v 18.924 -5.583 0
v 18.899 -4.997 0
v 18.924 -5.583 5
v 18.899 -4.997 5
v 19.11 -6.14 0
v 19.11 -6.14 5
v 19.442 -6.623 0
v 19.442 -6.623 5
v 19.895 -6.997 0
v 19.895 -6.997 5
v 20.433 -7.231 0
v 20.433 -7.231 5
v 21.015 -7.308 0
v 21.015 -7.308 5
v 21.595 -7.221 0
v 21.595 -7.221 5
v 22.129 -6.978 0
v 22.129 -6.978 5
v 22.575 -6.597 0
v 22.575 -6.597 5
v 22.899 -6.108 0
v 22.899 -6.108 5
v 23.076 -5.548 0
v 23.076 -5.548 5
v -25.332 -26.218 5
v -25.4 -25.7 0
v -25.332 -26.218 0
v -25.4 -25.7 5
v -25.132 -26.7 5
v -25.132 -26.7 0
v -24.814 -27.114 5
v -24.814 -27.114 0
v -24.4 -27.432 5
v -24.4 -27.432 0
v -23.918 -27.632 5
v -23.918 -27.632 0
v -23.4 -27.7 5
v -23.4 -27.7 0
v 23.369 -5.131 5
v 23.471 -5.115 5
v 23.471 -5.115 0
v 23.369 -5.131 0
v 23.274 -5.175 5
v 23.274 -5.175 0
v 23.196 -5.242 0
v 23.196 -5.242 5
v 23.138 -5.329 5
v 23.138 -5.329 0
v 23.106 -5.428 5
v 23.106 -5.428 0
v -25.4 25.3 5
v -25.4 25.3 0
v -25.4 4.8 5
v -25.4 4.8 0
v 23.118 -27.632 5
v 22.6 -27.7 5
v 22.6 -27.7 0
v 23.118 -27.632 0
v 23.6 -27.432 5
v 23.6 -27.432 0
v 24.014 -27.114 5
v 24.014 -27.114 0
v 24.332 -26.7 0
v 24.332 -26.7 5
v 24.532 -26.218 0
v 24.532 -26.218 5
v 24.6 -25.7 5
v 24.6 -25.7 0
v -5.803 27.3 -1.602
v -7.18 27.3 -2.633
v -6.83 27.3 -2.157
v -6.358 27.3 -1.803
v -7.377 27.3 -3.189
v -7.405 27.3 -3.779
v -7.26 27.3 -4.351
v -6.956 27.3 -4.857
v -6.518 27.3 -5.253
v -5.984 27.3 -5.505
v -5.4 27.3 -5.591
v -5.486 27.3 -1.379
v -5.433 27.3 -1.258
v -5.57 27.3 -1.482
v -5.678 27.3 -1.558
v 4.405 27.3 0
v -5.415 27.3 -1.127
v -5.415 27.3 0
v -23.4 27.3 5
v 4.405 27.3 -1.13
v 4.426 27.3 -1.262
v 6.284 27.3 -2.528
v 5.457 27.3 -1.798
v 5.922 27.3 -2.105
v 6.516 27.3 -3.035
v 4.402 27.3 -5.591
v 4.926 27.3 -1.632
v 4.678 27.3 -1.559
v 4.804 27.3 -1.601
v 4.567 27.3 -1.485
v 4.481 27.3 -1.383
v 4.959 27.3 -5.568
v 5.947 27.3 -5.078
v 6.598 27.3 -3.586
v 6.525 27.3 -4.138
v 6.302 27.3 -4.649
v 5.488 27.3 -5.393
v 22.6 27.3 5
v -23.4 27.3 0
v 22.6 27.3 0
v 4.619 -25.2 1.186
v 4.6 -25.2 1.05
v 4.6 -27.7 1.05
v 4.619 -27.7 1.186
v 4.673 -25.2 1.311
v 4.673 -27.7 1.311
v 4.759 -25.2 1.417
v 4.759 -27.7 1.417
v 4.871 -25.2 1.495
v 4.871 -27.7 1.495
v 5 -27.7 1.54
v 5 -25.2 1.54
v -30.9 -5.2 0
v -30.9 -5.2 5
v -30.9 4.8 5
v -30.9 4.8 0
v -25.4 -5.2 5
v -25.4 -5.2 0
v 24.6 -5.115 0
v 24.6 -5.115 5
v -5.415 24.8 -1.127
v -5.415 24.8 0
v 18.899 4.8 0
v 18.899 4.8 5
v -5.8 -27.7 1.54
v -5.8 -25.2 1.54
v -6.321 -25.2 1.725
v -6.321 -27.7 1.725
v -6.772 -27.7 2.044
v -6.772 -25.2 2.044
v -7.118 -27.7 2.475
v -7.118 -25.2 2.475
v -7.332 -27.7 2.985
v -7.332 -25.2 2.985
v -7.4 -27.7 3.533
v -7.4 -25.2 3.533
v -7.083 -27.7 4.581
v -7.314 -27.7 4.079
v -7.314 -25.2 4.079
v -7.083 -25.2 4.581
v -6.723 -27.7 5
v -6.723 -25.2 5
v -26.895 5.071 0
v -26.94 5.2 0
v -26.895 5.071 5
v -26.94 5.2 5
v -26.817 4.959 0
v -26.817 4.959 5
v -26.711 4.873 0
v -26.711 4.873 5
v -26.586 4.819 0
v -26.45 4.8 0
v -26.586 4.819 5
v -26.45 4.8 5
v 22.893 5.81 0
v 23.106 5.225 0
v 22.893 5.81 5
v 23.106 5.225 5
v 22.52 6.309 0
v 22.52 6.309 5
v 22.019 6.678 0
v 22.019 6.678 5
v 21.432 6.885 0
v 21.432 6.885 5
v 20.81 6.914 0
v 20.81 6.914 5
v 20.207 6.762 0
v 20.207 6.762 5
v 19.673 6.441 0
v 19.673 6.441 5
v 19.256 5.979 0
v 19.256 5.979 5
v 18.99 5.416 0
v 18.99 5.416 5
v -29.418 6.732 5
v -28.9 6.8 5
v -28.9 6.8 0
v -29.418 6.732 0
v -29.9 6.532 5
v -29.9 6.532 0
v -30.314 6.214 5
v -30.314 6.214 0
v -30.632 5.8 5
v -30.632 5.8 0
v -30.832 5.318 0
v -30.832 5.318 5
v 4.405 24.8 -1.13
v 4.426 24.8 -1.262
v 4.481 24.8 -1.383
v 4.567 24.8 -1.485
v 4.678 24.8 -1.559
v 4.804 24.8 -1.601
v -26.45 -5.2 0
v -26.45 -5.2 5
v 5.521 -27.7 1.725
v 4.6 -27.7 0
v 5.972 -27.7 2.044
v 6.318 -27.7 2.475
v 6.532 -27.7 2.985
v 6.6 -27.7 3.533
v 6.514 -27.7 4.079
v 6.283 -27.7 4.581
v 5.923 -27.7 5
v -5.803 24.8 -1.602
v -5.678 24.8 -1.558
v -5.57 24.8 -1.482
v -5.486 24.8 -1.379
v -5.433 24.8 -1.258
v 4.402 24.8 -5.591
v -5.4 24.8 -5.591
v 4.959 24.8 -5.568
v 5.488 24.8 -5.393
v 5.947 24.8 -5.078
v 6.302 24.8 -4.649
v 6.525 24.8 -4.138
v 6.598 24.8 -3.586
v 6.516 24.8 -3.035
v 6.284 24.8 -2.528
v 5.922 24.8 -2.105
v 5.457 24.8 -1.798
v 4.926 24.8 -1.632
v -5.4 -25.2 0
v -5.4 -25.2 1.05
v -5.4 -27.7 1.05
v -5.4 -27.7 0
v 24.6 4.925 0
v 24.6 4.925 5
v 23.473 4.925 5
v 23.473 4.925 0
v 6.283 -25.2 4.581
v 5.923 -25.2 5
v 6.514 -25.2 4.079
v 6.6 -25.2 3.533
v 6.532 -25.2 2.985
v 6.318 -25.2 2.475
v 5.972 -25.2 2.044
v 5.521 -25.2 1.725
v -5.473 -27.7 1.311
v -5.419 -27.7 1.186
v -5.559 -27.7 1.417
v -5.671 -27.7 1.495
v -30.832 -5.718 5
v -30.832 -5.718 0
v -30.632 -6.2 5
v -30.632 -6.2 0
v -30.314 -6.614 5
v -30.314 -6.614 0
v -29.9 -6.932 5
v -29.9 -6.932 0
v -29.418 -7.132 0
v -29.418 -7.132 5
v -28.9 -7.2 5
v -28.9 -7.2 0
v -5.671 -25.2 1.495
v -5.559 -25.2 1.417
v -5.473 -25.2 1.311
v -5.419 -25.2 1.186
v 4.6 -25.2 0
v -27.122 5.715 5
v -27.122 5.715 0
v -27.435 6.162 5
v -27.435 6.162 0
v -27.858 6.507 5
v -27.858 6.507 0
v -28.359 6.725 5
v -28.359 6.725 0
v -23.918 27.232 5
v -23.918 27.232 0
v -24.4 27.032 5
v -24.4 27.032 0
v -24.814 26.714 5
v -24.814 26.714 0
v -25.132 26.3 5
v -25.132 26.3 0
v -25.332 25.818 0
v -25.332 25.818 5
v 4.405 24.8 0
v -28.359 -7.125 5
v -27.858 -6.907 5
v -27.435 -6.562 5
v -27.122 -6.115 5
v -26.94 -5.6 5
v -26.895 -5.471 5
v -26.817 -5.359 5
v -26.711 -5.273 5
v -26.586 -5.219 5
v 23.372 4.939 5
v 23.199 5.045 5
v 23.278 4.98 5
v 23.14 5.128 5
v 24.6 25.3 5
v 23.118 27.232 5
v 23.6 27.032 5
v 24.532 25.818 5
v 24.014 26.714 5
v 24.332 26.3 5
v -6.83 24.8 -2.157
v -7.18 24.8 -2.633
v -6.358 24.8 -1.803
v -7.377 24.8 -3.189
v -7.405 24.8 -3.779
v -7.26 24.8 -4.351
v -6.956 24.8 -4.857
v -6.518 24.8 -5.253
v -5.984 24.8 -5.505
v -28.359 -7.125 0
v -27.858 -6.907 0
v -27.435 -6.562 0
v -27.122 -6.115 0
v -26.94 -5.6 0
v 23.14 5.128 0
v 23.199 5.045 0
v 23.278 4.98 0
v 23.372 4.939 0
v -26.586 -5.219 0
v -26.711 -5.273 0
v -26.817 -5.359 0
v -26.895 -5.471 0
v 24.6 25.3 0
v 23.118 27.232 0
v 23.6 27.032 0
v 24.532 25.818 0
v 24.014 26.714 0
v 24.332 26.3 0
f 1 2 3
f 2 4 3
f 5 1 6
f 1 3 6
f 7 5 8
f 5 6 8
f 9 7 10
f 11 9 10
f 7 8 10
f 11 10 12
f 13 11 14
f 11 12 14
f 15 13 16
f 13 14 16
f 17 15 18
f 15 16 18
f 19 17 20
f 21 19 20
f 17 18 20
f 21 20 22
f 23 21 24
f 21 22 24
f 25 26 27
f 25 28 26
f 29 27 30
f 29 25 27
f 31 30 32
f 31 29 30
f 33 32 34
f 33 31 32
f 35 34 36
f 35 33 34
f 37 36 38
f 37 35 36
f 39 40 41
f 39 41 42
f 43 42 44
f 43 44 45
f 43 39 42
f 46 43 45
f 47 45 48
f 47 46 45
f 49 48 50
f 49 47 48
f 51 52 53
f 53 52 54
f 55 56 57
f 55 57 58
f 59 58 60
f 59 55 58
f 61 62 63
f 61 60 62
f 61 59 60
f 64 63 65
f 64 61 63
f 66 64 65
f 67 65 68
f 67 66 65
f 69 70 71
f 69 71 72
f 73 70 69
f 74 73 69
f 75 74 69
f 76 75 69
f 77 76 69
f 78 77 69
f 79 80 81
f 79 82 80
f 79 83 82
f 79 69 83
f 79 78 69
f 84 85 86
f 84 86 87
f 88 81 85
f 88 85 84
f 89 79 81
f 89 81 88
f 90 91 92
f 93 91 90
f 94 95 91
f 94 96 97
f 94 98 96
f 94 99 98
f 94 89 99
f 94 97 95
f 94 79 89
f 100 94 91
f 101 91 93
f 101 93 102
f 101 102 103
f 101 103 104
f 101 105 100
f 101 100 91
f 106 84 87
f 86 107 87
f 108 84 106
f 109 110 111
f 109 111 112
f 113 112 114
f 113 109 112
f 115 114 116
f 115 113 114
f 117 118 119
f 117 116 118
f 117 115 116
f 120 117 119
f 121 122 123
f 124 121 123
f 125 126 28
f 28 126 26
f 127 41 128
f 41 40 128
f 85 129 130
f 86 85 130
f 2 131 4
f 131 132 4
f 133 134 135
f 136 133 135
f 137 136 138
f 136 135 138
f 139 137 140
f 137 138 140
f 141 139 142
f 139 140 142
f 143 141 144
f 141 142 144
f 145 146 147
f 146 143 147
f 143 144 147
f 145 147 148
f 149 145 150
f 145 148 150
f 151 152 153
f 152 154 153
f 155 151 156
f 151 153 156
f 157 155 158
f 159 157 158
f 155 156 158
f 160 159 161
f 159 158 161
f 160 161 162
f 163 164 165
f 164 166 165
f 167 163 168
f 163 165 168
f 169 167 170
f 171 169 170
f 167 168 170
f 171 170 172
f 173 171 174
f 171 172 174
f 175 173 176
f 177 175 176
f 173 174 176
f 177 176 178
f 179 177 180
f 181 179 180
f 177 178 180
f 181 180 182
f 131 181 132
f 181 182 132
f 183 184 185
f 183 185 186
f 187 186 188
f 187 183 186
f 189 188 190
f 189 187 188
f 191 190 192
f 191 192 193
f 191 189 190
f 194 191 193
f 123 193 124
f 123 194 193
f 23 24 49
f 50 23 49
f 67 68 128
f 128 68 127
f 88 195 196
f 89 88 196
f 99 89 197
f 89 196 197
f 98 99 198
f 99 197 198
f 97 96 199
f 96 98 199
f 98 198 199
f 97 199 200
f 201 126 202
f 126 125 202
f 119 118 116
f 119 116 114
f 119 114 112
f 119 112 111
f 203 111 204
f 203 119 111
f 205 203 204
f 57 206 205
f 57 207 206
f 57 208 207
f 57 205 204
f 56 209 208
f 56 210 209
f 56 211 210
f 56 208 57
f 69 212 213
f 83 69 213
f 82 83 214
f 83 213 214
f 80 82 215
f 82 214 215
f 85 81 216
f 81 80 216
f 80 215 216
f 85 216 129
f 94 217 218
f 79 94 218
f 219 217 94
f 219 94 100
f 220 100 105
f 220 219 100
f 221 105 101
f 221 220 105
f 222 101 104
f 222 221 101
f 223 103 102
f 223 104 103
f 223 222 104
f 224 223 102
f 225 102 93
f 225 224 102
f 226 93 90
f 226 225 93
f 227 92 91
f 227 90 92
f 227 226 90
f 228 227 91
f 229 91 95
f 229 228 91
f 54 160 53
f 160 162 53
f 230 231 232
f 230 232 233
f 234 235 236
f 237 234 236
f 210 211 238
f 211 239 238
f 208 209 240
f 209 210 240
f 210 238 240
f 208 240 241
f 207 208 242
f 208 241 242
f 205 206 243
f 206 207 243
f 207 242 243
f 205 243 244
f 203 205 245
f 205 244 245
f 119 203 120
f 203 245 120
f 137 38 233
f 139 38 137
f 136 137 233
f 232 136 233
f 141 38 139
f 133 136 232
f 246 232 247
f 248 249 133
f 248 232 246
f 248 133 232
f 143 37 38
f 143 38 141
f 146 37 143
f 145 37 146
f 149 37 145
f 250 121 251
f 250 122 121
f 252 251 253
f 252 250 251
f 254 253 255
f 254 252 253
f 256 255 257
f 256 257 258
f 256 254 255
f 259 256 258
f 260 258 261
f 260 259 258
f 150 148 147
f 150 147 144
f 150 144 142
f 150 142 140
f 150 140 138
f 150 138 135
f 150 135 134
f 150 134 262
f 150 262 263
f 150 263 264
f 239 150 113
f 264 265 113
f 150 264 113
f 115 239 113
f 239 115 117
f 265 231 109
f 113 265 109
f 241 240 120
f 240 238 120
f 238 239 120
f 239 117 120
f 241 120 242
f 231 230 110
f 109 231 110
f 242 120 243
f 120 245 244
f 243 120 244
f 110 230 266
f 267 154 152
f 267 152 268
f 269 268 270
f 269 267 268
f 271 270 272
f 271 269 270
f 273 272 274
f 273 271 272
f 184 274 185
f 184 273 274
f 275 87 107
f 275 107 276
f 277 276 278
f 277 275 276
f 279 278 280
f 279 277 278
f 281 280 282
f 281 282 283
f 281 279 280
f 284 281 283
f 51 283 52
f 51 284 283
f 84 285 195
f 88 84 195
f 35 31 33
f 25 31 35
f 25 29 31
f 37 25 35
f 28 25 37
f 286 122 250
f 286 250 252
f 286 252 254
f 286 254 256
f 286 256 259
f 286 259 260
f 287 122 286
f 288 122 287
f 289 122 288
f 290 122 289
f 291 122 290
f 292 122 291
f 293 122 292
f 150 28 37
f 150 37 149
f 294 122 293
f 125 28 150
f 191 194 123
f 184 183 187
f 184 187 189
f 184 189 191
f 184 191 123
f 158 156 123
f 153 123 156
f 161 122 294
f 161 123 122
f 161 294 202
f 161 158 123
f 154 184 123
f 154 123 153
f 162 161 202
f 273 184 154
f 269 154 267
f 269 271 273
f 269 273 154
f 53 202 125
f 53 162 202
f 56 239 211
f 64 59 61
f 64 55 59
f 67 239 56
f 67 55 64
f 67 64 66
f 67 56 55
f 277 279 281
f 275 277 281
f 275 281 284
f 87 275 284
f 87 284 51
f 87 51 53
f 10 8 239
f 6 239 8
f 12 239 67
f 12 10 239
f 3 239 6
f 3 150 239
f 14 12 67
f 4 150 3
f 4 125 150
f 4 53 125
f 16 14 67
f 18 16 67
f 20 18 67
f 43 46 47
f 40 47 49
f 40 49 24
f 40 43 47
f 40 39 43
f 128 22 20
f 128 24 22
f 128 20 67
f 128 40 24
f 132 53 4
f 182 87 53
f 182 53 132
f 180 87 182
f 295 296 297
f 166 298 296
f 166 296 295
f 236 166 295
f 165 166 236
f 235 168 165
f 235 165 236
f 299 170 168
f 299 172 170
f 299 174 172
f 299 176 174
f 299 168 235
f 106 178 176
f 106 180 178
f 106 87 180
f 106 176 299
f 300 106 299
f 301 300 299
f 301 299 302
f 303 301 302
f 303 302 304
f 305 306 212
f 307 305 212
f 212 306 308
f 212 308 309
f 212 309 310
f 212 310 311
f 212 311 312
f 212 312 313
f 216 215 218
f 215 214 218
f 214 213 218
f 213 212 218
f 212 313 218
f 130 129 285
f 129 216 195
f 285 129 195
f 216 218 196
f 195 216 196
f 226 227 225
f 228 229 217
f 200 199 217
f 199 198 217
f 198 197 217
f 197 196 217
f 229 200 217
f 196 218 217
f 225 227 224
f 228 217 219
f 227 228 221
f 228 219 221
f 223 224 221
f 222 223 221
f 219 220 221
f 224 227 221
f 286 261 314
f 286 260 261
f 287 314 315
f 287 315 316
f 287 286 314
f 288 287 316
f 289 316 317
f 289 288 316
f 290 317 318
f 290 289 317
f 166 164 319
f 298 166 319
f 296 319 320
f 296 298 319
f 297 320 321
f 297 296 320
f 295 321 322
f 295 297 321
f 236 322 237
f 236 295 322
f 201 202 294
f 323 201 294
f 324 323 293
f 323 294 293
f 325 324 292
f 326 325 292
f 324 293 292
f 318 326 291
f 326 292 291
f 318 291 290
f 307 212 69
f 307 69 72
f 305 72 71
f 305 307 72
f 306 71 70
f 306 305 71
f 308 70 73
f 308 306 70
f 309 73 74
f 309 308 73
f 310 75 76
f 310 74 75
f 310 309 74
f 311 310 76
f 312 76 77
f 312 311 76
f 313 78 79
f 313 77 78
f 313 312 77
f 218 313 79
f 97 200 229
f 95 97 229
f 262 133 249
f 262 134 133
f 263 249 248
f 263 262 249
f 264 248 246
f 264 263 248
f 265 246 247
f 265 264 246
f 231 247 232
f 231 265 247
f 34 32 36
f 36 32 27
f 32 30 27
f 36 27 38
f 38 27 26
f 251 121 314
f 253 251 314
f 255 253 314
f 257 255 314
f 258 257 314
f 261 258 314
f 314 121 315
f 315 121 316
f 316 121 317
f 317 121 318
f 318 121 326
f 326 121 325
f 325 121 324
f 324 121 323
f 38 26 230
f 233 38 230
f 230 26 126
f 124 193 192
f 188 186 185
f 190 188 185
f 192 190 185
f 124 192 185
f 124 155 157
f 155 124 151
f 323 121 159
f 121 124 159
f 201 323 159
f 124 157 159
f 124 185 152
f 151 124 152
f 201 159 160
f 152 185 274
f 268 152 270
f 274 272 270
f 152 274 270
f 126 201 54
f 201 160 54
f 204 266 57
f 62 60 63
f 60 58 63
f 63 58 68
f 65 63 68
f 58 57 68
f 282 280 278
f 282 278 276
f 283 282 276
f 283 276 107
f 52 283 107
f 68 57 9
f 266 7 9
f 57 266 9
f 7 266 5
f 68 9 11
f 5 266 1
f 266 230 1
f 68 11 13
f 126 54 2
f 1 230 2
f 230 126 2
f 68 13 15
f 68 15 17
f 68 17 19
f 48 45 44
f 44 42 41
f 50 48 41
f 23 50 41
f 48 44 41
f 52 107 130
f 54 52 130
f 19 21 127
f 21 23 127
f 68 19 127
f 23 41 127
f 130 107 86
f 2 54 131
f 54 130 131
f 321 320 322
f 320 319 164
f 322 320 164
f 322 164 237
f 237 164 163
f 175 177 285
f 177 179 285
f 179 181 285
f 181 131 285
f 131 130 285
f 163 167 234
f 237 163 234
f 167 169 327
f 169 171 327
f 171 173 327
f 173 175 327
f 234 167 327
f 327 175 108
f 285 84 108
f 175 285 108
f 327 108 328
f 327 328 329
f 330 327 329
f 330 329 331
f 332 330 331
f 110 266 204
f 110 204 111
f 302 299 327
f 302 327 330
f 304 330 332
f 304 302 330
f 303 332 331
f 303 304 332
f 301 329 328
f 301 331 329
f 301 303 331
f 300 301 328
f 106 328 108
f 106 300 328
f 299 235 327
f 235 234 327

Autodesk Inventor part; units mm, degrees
ref_plane "YZ Plane" through (0, 0, 0) normal (1, 0, 0) x (0, 1, 0)
ref_plane "XZ Plane" through (0, 0, 0) normal (0, 1, 0) x (-1, 0, 0)
ref_plane "XY Plane" through (0, 0, 0) normal (0, 0, 1) x (1, 0, 0)
sketch "Skizze1" plane through (0, 0, 0) normal (0, 0, 1) x (1, 0, 0)
  line L0 (-17.4, -0.2) -> (-25.4, -0.2)
  line L1 (-25.4, -0.2) -> (-25.4, -23.2)
  line L2 (-23.4, -25.2) -> (-0.4, -25.2)
  line L3 (-0.4, -25.2) -> (-0.4, -17.2)
  line L4 (-17.4, -0.2) -> (-17.4, -15.2)
  line L5 (-15.4, -17.2) -> (-0.4, -17.2)
  arc A0 (-25.4, -23.2) -> (-23.4, -25.2) centre (-23.4, -23.2) ccw
  circle A1 centre (-20.4, -20.2) radius 2.425
  circle A2 centre (-21.2, -14.7) radius 2.65
  circle A3 centre (-14.9, -21) radius 2.65
  arc A4 (-17.4, -15.2) -> (-15.4, -17.2) centre (-15.4, -15.2) ccw
  circle A5 centre (-20.4, -20.2) radius 2.425
  circle A6 centre (-14.9, -21) radius 2.65
  circle A7 centre (-21.2, -14.7) radius 2.65
  line L6 (-17.4, -0.2) -> (-0.4, -0.2)
  line L7 (-0.4, -0.2) -> (-0.4, -17.2)
  line L8 (-25.4, -23.2) -> (-25.4, -25.2)
  line L9 (-25.4, -25.2) -> (-23.4, -25.2)
  point P0 (-17.4, -17.2)
  dimension "d278" = 25
  dimension "d279" = 25
  dimension "d2" = 8
  dimension "d281" = 8
  dimension "d282" = 2
  dimension "d283" = 4.85
  dimension "d284" = 20
  dimension "d4" = 20
  dimension "d286" = 5.3
  dimension "d_hole" = 5.3
  dimension "d290" = 20.8
  dimension "d" = 20.8
  dimension "d292" = 2
  dimension "d313" = 6.3
  dimension "d314" = 6.3
  dimension "d330" = 0
  dimension "d331" = 0
  dimension "d332" = 0
extrude "Extrusion1" add sketch "Skizze1" along normal blind 5 contours L4 A4 L5 L3 L2 A0 L1 L0 | L6 L7 L5 A4 L4 | A0 L9 L8 | A1 | A2 | A3
mirror "Mirror6" about plane through (-17.4, -0.2, 0) normal (0, 1, 0) of "Extrusion1"
mirror "Mirror7" about plane through (-0.4, -25.2, 0) normal (1, 0, 0) of "Extrusion1", "Mirror6"
sketch "Sketch26" plane through (0, 0, 5) normal (0, 0, 1) x (1, 0, 0)
  line L0 (24.6, 24.8) -> (-25.4, 24.8) projected
  line L1 (-25.4, -25.2) -> (-25.4, 24.8) projected
  line L2 (-25.4, -25.2) -> (24.6, -25.2) projected
  line L3 (24.6, 24.8) -> (24.6, -25.2) projected
  line L4 (-25.4, -23.2) -> (-25.4, 22.8) projected
  line L5 (-28.9, -7.2) -> (-28.9, -7.2)
  line L6 (-30.9, -5.2) -> (-30.9, 4.8)
  line L7 (-28.9, 6.8) -> (-28.9, 6.8)
  line L8 (-25.4, 6.8) -> (-25.4, -7.2)
  line L9 (-26.9, -5.2) -> (-26.9, 4.8)
  line L10 (-26.4505, 4.8) -> (-25.4, 4.8)
  line L11 (-25.4, 4.8) -> (-25.4, -5.2)
  line L12 (-25.4, -5.2) -> (-26.4505, -5.2)
  line L13 (-26.9, -5.2) -> (-25.4, 4.8) construction
  line L14 (-26.9, 4.8) -> (-25.4, -5.2) construction
  line L15 (-26.9, -5.2) -> (-26.9, -5.2)
  line L16 (-26.9, 4.8) -> (-26.9, 4.8)
  arc A0 (-30.9, -5.2) -> (-28.9, -7.2) centre (-28.9, -5.2) ccw
  arc A1 (-28.9, -7.2) -> (-26.9404, -5.6) centre (-28.9, -5.2) ccw
  arc A2 (-28.9, 6.8) -> (-30.9, 4.8) centre (-28.9, 4.8) ccw
  arc A3 (-26.9404, 5.2) -> (-28.9, 6.8) centre (-28.9, 4.8) ccw
  arc A4 (-26.4505, -5.2) -> (-26.9404, -5.6) centre (-26.4505, -5.7) ccw
  arc A5 (-26.9404, 5.2) -> (-26.4505, 4.8) centre (-26.4505, 5.3) ccw
  point P0 (0, 0)
  point P1 (-26.15, -0.2)
  point P2 (-25.4, -0.2)
  dimension "d293" = 5.5
  dimension "d294" = 14
  dimension "d295" = 18
  dimension "d296" = 10
  dimension "d297" = 1.5
  dimension "d300" = 2
  dimension "d301" = 0.5
extrude "Extrusion13" add sketch "Sketch26" against normal up to surface (5 mm away) contours L1 L12 A4 A1 A0 L6 A2 A3 A5 L10
sketch "Sketch27" plane through (0, 0, 5) normal (0, 0, 1) x (1, 0, 0)
  line L0 (24.6, 24.8) -> (-25.4, 24.8) projected
  line L1 (-25.4, -25.2) -> (-25.4, -5.2) projected
  line L2 (-26.4505, 4.8) -> (-25.4, 4.8) projected
  arc A0 (-26.9404, 5.2) -> (-26.4505, 4.8) centre (-26.4505, 5.3) ccw projected
  arc A1 (-26.9404, 5.2) -> (-30.9, 4.8) centre (-28.9, 4.8) ccw projected
  line L3 (-30.9, -5.2) -> (-30.9, 4.8) projected
  arc A2 (-30.9, -5.2) -> (-26.9404, -5.6) centre (-28.9, -5.2) ccw projected
  arc A3 (-26.4505, -5.2) -> (-26.9404, -5.6) centre (-26.4505, -5.7) ccw projected
  line L4 (-25.4, -5.2) -> (-26.4505, -5.2) projected
  line L5 (-25.4, 4.8) -> (-25.4, 24.8) projected
  line L6 (-25.4, -25.2) -> (24.6, -25.2) projected
  line L7 (24.6, 24.8) -> (24.6, -25.2) projected
  circle A4 centre (-0.4, -0.2) radius 17
  point P0 (0, 0)
sketch "Sketch28" plane through (0, 0, 5) normal (0, 0, 1) x (1, 0, 0)
  line L0 (24.6, 24.8) -> (-25.4, 24.8) projected
  line L1 (-25.4, -25.2) -> (-25.4, -5.2) projected
  line L2 (-26.4505, 4.8) -> (-25.4, 4.8) projected
  arc A0 (-26.9404, 5.2) -> (-26.4505, 4.8) centre (-26.4505, 5.3) ccw projected
  arc A1 (-26.9404, 5.2) -> (-30.9, 4.8) centre (-28.9, 4.8) ccw projected
  line L3 (-30.9, -5.2) -> (-30.9, 4.8) projected
  arc A2 (-30.9, -5.2) -> (-26.9404, -5.6) centre (-28.9, -5.2) ccw projected
  arc A3 (-26.4505, -5.2) -> (-26.9404, -5.6) centre (-26.4505, -5.7) ccw projected
  line L4 (-25.4, -5.2) -> (-26.4505, -5.2) projected
  line L5 (-25.4, 4.8) -> (-25.4, 24.8) projected
  line L6 (-25.4, -25.2) -> (24.6, -25.2) projected
  line L7 (24.6, 24.8) -> (24.6, -25.2) projected
  line L8 (-25.4, 22.8) -> (-25.4, 4.8) projected
  line L9 (-25.4, -5.2) -> (-25.4, 4.8)
  line L10 (-30.9, -5.2) -> (-30.9, 4.8)
  arc A4 (-30.9, -5.2) -> (-26.9687, -5.7197) centre (-28.9, -5.2) ccw
  arc A5 (-26.9404, 5.2) -> (-30.9, 4.8) centre (-28.9, 4.8) ccw
  line L11 (-25.4, -5.2) -> (-26.2523, -5.2)
  line L12 (-25.4, 4.8) -> (-26.4505, 4.8)
  arc A6 (-26.2523, -5.2) -> (-25.9588, -5.6095) centre (-25.7545, -5.1531) ccw
  arc A7 (-26.9404, 5.2) -> (-26.4505, 4.8) centre (-26.4505, 5.3) ccw
  arc A8 (-26.9404, 5.2) -> (-26.4505, 4.8) centre (-26.4505, 5.3) ccw projected
  line L13 (-26.9404, 5.2) -> (-26.9404, 5.2)
  line L14 (-26.9687, -5.7197) -> (-25.9588, -5.6095)
  line L15 (24.527, -5.0054) -> (24.527, 4.8151)
  line L16 (19.0089, -5.0023) -> (19.0089, 4.8)
  arc A9 (19.0089, -5.0023) -> (22.9683, -5.5256) centre (20.997, -5.2) ccw
  arc A10 (22.9981, 5.203) -> (19.0089, 4.8) centre (21.0238, 4.8) ccw
  line L17 (24.527, -5.0054) -> (23.4703, -5.0054)
  line L18 (24.527, 4.8151) -> (23.4731, 4.8151)
  arc A11 (23.4703, -5.0054) -> (22.9989, -5.4045) centre (23.4777, -5.4921) ccw
  arc A12 (22.9977, 5.2047) -> (23.4731, 4.8151) centre (23.4731, 5.2998) ccw
  line L19 (22.9977, 5.2047) -> (22.9981, 5.203)
  line L20 (22.9683, -5.5256) -> (22.9989, -5.4045)
  line L21 (18.9339, 4.8) -> (18.9339, -4.9986)
  arc A13 (18.9339, -4.9986) -> (23.0417, -5.541) centre (20.997, -5.2) ccw
  line L22 (23.0417, -5.541) -> (23.0722, -5.4203)
  arc A14 (23.4709, -5.0804) -> (23.0722, -5.4203) centre (23.4777, -5.4921) ccw
  line L23 (23.4709, -5.0804) -> (24.602, -5.0804)
  line L24 (24.602, -5.0804) -> (24.602, 4.8901)
  line L25 (24.602, 4.8901) -> (23.4731, 4.8901)
  arc A15 (23.0716, 5.2179) -> (23.4731, 4.8901) centre (23.4731, 5.2998) ccw
  arc A16 (23.0716, 5.2179) -> (18.9339, 4.8) centre (21.0238, 4.8) ccw
  point P0 (0, 0)
  dimension "d307" = 0.075
  dimension "d315" = 0.1946
  dimension "d316" = 0
  dimension "d317" = 0
  dimension "d318" = 0.0901
extrude "Extrusion14" cut sketch "Sketch28" against normal blind 10 contours L7 L23 A14 L22 A13 L21 A16 A15 L25 | L17 A11 L20 A9 L16 A10 A12 L18 L15
sketch "Sketch30" plane through (0, 0, 5) normal (0, 0, 1) x (1, 0, 0)
  line L0 (24.6, 24.8) -> (-25.4, 24.8) construction
  line L1 (-25.4, -25.2) -> (-25.4, -5.2) construction
  line L2 (-26.4505, 4.8) -> (-25.4, 4.8) construction
  arc A0 (-26.9404, 5.2) -> (-26.4505, 4.8) centre (-26.4505, 5.3) ccw construction
  arc A1 (-26.9404, 5.2) -> (-30.9, 4.8) centre (-28.9, 4.8) ccw construction
  line L3 (-30.9, -5.2) -> (-30.9, 4.8) construction
  arc A2 (-30.9, -5.2) -> (-26.9404, -5.6) centre (-28.9, -5.2) ccw construction
  arc A3 (-26.4505, -5.2) -> (-26.9404, -5.6) centre (-26.4505, -5.7) ccw construction
  line L4 (-25.4, -5.2) -> (-26.4505, -5.2) construction
  line L5 (-25.4, 4.8) -> (-25.4, 24.8) construction
  line L6 (-25.4, -25.2) -> (24.6, -25.2) construction
  line L7 (24.6, 24.8) -> (24.6, 4.8901) construction
  line L8 (24.6, -5.0804) -> (23.4709, -5.0804) construction
  arc A4 (23.4709, -5.0804) -> (23.0722, -5.4203) centre (23.4777, -5.4921) ccw construction
  line L9 (23.0722, -5.4203) -> (23.0417, -5.541) construction
  arc A5 (18.9339, -4.9986) -> (23.0417, -5.541) centre (20.997, -5.2) ccw construction
  line L10 (18.9339, -4.9986) -> (18.9339, 4.8) construction
  arc A6 (23.0716, 5.2179) -> (18.9339, 4.8) centre (21.0238, 4.8) ccw construction
  arc A7 (23.0716, 5.2179) -> (23.4731, 4.8901) centre (23.4731, 5.2998) ccw construction
  line L11 (23.4731, 4.8901) -> (24.6, 4.8901) construction
  line L12 (24.6, -5.0804) -> (24.6, -25.2) construction
  line L13 (-28.9, -7.2) -> (-28.9, -7.2)
  line L14 (-30.9, -5.2) -> (-30.9, 4.8)
  line L15 (-28.9, 6.8) -> (-28.9, 6.8)
  line L16 (-26.9, -5.2) -> (-26.9, 4.8)
  line L17 (-26.4505, 4.8) -> (-25.4, 4.8)
  line L18 (-25.4, 4.8) -> (-25.4, -5.2)
  line L19 (-25.4, -5.2) -> (-26.4505, -5.2)
  line L20 (-26.9, -5.2) -> (-25.4, 4.8) construction
  line L21 (-26.9, 4.8) -> (-25.4, -5.2) construction
  line L22 (-26.9, -5.2) -> (-26.9, -5.2)
  line L23 (-26.9, 4.8) -> (-26.9, 4.8)
  arc A8 (-30.9, -5.2) -> (-28.9, -7.2) centre (-28.9, -5.2) ccw
  arc A9 (-28.9, -7.2) -> (-26.9404, -5.6) centre (-28.9, -5.2) ccw
  arc A10 (-28.9, 6.8) -> (-30.9, 4.8) centre (-28.9, 4.8) ccw
  arc A11 (-26.9404, 5.2) -> (-28.9, 6.8) centre (-28.9, 4.8) ccw
  arc A12 (-26.4505, -5.2) -> (-26.9404, -5.6) centre (-26.4505, -5.7) ccw
  arc A13 (-26.9404, 5.2) -> (-26.4505, 4.8) centre (-26.4505, 5.3) ccw
  arc A14 (-28.9, 6.875) -> (-30.975, 4.8) centre (-28.9, 4.8) ccw
  line L24 (-30.975, 4.8) -> (-30.975, -5.2)
  arc A15 (-30.975, -5.2) -> (-29.5327, -7.1762) centre (-28.9, -5.2) ccw
  arc A16 (-29.5327, -7.1762) -> (-26.8669, -5.615) centre (-28.9, -5.2) ccw
  arc A17 (-26.4505, -5.275) -> (-26.8669, -5.615) centre (-26.4505, -5.7) ccw
  line L25 (-26.4505, -5.275) -> (-25.325, -5.275)
  line L26 (-25.325, -5.275) -> (-25.325, 4.875)
  line L27 (-25.325, 4.875) -> (-26.4505, 4.875)
  arc A18 (-26.8669, 5.215) -> (-26.4505, 4.875) centre (-26.4505, 5.3) ccw
  arc A19 (-26.8669, 5.215) -> (-28.9, 6.875) centre (-28.9, 4.8) ccw
  arc A20 (-28.9, 6.8) -> (-30.9, 4.8) centre (-28.9, 4.8) ccw
  line L28 (-30.9, 4.8) -> (-30.9, -5.2)
  arc A21 (-30.9, -5.2) -> (-29.5098, -7.1048) centre (-28.9, -5.2) ccw
  arc A22 (-29.5098, -7.1048) -> (-26.9404, -5.6) centre (-28.9, -5.2) ccw
  arc A23 (-26.4505, -5.2) -> (-26.9404, -5.6) centre (-26.4505, -5.7) ccw
  line L29 (-26.4505, -5.2) -> (-25.4, -5.2)
  line L30 (-25.4, 4.8) -> (-26.4505, 4.8)
  arc A24 (-26.9404, 5.2) -> (-26.4505, 4.8) centre (-26.4505, 5.3) ccw
  arc A25 (-26.9404, 5.2) -> (-28.9, 6.8) centre (-28.9, 4.8) ccw
  line L31 (-25.4, 4.8) -> (-25.4, -5.2)
  line L32 (-26.4505, 4.8) -> (-25.4, 4.8) projected
  line L33 (-25.4, 4.8) -> (-25.4, 4.8)
  line L34 (-25.4, -5.2) -> (-26.4505, -5.2) projected
  line L35 (-25.4, -5.2) -> (-25.4, -5.2)
  arc A26 (22.9977, 5.2047) -> (23.4731, 4.8151) centre (23.4731, 5.2998) ccw
  line L36 (24.527, -5.0054) -> (24.527, 4.8151)
  line L37 (19.0089, -5.0023) -> (19.0089, 4.8)
  line L38 (24.527, -5.0054) -> (23.4703, -5.0054)
  arc A27 (23.4703, -5.0054) -> (22.9989, -5.4045) centre (23.4777, -5.4921) ccw
  line L39 (22.9683, -5.5256) -> (22.9989, -5.4045)
  arc A28 (19.0089, -5.0023) -> (22.9683, -5.5256) centre (20.997, -5.2) ccw
  line L40 (24.527, 4.8151) -> (23.4731, 4.8151)
  line L41 (22.9977, 5.2047) -> (22.9981, 5.203)
  arc A29 (22.9981, 5.203) -> (19.0089, 4.8) centre (21.0238, 4.8) ccw
  line L42 (18.8989, 4.8) -> (18.8989, -4.9969)
  arc A30 (18.8989, -4.9969) -> (23.076, -5.5482) centre (20.997, -5.2) ccw
  line L43 (23.076, -5.5482) -> (23.1065, -5.4276)
  arc A31 (23.4712, -5.1154) -> (23.1065, -5.4276) centre (23.4777, -5.4921) ccw
  line L44 (23.4712, -5.1154) -> (24.637, -5.1154)
  line L45 (24.637, -5.1154) -> (24.637, 4.9251)
  line L46 (24.637, 4.9251) -> (23.4731, 4.9251)
  arc A32 (23.1059, 5.2249) -> (23.4731, 4.9251) centre (23.4731, 5.2998) ccw
  arc A33 (23.1059, 5.2249) -> (18.8989, 4.8) centre (21.0238, 4.8) ccw
  line L47 (24.637, 4.9251) -> (24.637, -5.1154)
  line L48 (24.637, -5.1154) -> (23.4712, -5.1154)
  arc A34 (23.4712, -5.1154) -> (23.1065, -5.4276) centre (23.4777, -5.4921) ccw
  line L49 (23.1065, -5.4276) -> (23.076, -5.5482)
  arc A35 (18.8989, -4.9969) -> (23.076, -5.5482) centre (20.997, -5.2) ccw
  line L50 (18.8989, -4.9969) -> (18.8989, 4.8)
  arc A36 (23.1059, 5.2249) -> (18.8989, 4.8) centre (21.0238, 4.8) ccw
  arc A37 (23.1059, 5.2249) -> (23.4731, 4.9251) centre (23.4731, 5.2998) ccw
  line L51 (23.4731, 4.9251) -> (24.637, 4.9251)
  point P0 (-26.15, -0.2)
  point P1 (-25.4, -0.2)
  dimension "d334" = 14
  dimension "d336" = 10
  dimension "d337" = 1.5
  dimension "d338" = 2
  dimension "d339" = 0.5
  dimension "d340" = 0.075
  dimension "d341" = 0.075
  dimension "d342" = 0.075
  dimension "d343" = 0.075
  dimension "d346" = 0.11
  dimension "d347" = 0
extrude "Extrusion15" cut sketch "Sketch30" against normal blind 10 contours A26 L40 L36 L38 A27 L39 A28 L37 A29 | A33 A32 L46 L45 L44 A31 L43 A30 L42
sketch "Skizze32" plane through (-23.4, 24.8, 5) normal (0, 1, 0) x (1, 0, 0)
  line L0 (-2, 5) -> (48, 5) projected
  line L1 (48, 0) -> (-2, 0) projected
  circle A0 centre (2, 29.8) radius 2.5 projected
  circle A1 centre (23.4, 51) radius 2.5 projected
  line L2 (27.8804, 6.1291) -> (27.8804, 5) projected
  line L3 (27.8804, 5) -> (46, 5) projected
  arc A2 (46, 5) -> (48, 7) centre (46, 7) ccw projected
  line L4 (48, 24.9099) -> (48, 7) projected
  line L5 (48, 24.9099) -> (46.8731, 24.9099) projected
  arc A3 (46.8731, 24.9099) -> (46.4716, 24.5821) centre (46.8731, 24.5002) ccw projected
  arc A4 (42.3339, 25) -> (46.4716, 24.5821) centre (44.4238, 25) ccw projected
  line L6 (42.3339, 25) -> (42.3339, 34.7986) projected
  arc A5 (46.4417, 35.341) -> (42.3339, 34.7986) centre (44.397, 35) ccw projected
  line L7 (46.4417, 35.341) -> (46.4722, 35.2203) projected
  arc A6 (46.4722, 35.2203) -> (46.8709, 34.8804) centre (46.8777, 35.2921) ccw projected
  line L8 (46.8709, 34.8804) -> (48, 34.8804) projected
  line L9 (48, 53) -> (48, 34.8804) projected
  arc A7 (48, 53) -> (46, 55) centre (46, 53) ccw projected
  line L10 (46, 55) -> (28, 55) projected
  line L11 (28, 55) -> (28, 56.0505) projected
  arc A8 (28.4, 56.5404) -> (28, 56.0505) centre (28.5, 56.0505) ccw projected
  arc A9 (28.4, 56.5404) -> (28, 60.5) centre (28, 58.5) ccw projected
  line L12 (28, 60.5) -> (18, 60.5) projected
  arc A10 (18, 60.5) -> (17.6, 56.5404) centre (18, 58.5) ccw projected
  arc A11 (18, 56.0505) -> (17.6, 56.5404) centre (17.5, 56.0505) ccw projected
  line L13 (18, 56.0505) -> (18, 55) projected
  line L14 (18, 55) -> (0, 55) projected
  arc A12 (0, 55) -> (-2, 53) centre (0, 53) ccw projected
  line L15 (-2, 35) -> (-2, 53) projected
  line L16 (-2, 35) -> (-3.0505, 35) projected
  arc A13 (-3.5404, 35.4) -> (-3.0505, 35) centre (-3.0505, 35.5) ccw projected
  arc A14 (-3.5404, 35.4) -> (-7.5, 35) centre (-5.5, 35) ccw projected
  line L17 (-7.5, 35) -> (-7.5, 25) projected
  arc A15 (-7.5, 25) -> (-3.5404, 24.6) centre (-5.5, 25) ccw projected
  arc A16 (-3.0505, 25) -> (-3.5404, 24.6) centre (-3.0505, 24.5) ccw projected
  line L18 (-3.0505, 25) -> (-2, 25) projected
  line L19 (-2, 7) -> (-2, 25) projected
  arc A17 (-2, 7) -> (0, 5) centre (0, 7) ccw projected
  line L20 (0, 5) -> (17.9099, 5) projected
  line L21 (17.9099, 5) -> (17.9099, 6.1269) projected
  arc A18 (17.9099, 6.1269) -> (17.5821, 6.5284) centre (17.5002, 6.1269) ccw projected
  arc A19 (18, 10.6661) -> (17.5821, 6.5284) centre (18, 8.5762) ccw projected
  line L22 (18, 10.6661) -> (27.7986, 10.6661) projected
  arc A20 (28.341, 6.5583) -> (27.7986, 10.6661) centre (28, 8.603) ccw projected
  line L23 (28.341, 6.5583) -> (28.2203, 6.5278) projected
  arc A21 (28.2203, 6.5278) -> (27.8804, 6.1291) centre (28.2921, 6.1223) ccw projected
  line L24 (8, 13) -> (38, 13) projected
  arc A22 (6, 15) -> (8, 13) centre (8, 15) ccw projected
  line L25 (6, 15) -> (6, 45) projected
  arc A23 (8, 47) -> (6, 45) centre (8, 45) ccw projected
  line L26 (8, 47) -> (38, 47) projected
  arc A24 (40, 45) -> (38, 47) centre (38, 45) ccw projected
  line L27 (40, 45) -> (40, 15) projected
  arc A25 (38, 13) -> (40, 15) centre (38, 15) ccw projected
  circle A26 centre (43, 10) radius 2.425 projected
  circle A27 centre (37.5, 9.2) radius 2.65 projected
  circle A28 centre (43.8, 15.5) radius 2.65 projected
  circle A29 centre (43, 50) radius 2.425 projected
  circle A30 centre (37.5, 50.8) radius 2.65 projected
  circle A31 centre (43.8, 44.5) radius 2.65 projected
  circle A32 centre (3, 10) radius 2.425 projected
  circle A33 centre (8.5, 9.2) radius 2.65 projected
  circle A34 centre (2.2, 15.5) radius 2.65 projected
  circle A35 centre (2.2, 44.5) radius 2.65 projected
  circle A36 centre (8.5, 50.8) radius 2.65 projected
  circle A37 centre (3, 50) radius 2.425 projected
  line L28 (-2, 5) -> (-2, 0) projected
  line L29 (48, 5) -> (48, 0) projected
  line L30 (-2, 0) -> (48, 0)
  line L31 (48, 0) -> (48, 5)
  line L32 (48, 5) -> (-2, 5)
  line L33 (-2, 5) -> (-2, 0)
  line L34 (-2, 5) -> (-2, 0) projected
  line L35 (48, 5) -> (48, 0) projected
  arc A38 (17.9849, 6.1269) -> (17.5971, 6.6019) centre (17.5002, 6.1269) ccw
  line L36 (17.9849, 6.1269) -> (17.9849, 4.925)
  line L37 (17.9849, 4.925) -> (0, 4.925)
  arc A39 (-2.075, 7) -> (0, 4.925) centre (0, 7) ccw
  line L38 (-2.075, 7) -> (-2.075, 24.925)
  line L39 (-2.075, 24.925) -> (-3.0505, 24.925)
  arc A40 (-3.0505, 24.925) -> (-3.4669, 24.585) centre (-3.0505, 24.5) ccw
  arc A41 (-7.575, 25) -> (-3.4669, 24.585) centre (-5.5, 25) ccw
  line L40 (-7.575, 25) -> (-7.575, 35)
  arc A42 (-3.4669, 35.415) -> (-7.575, 35) centre (-5.5, 35) ccw
  arc A43 (-3.4669, 35.415) -> (-3.0505, 35.075) centre (-3.0505, 35.5) ccw
  line L41 (-3.0505, 35.075) -> (-2.075, 35.075)
  line L42 (-2.075, 35.075) -> (-2.075, 53)
  arc A44 (0, 55.075) -> (-2.075, 53) centre (0, 53) ccw
  line L43 (0, 55.075) -> (17.925, 55.075)
  line L44 (17.925, 55.075) -> (17.925, 56.0505)
  arc A45 (17.925, 56.0505) -> (17.585, 56.4669) centre (17.5, 56.0505) ccw
  arc A46 (18, 60.575) -> (17.585, 56.4669) centre (18, 58.5) ccw
  line L45 (18, 60.575) -> (28, 60.575)
  arc A47 (28.415, 56.4669) -> (28, 60.575) centre (28, 58.5) ccw
  arc A48 (28.415, 56.4669) -> (28.075, 56.0505) centre (28.5, 56.0505) ccw
  line L46 (28.075, 56.0505) -> (28.075, 55.075)
  line L47 (28.075, 55.075) -> (46, 55.075)
  arc A49 (48.075, 53) -> (46, 55.075) centre (46, 53) ccw
  line L48 (48.075, 53) -> (48.075, 34.8054)
  line L49 (48.075, 34.8054) -> (46.8703, 34.8054)
  arc A50 (46.3989, 35.2045) -> (46.8703, 34.8054) centre (46.8777, 35.2921) ccw
  line L50 (46.3989, 35.2045) -> (46.3683, 35.3256)
  arc A51 (46.3683, 35.3256) -> (42.4089, 34.8023) centre (44.397, 35) ccw
  line L51 (42.4089, 34.8023) -> (42.4089, 25)
  arc A52 (42.4089, 25) -> (46.3981, 24.5971) centre (44.4238, 25) ccw
  arc A53 (46.8731, 24.9849) -> (46.3981, 24.5971) centre (46.8731, 24.5002) ccw
  line L52 (46.8731, 24.9849) -> (48.075, 24.9849)
  line L53 (48.075, 24.9849) -> (48.075, 7)
  arc A54 (46, 4.925) -> (48.075, 7) centre (46, 7) ccw
  line L54 (46, 4.925) -> (27.8054, 4.925)
  line L55 (27.8054, 4.925) -> (27.8054, 6.1297)
  arc A55 (28.2045, 6.6011) -> (27.8054, 6.1297) centre (28.2921, 6.1223) ccw
  line L56 (28.2045, 6.6011) -> (28.3256, 6.6317)
  arc A56 (28.3256, 6.6317) -> (27.8023, 10.5911) centre (28, 8.603) ccw
  line L57 (27.8023, 10.5911) -> (18, 10.5911)
  arc A57 (18, 10.5911) -> (17.5971, 6.6019) centre (18, 8.5762) ccw
  point P0 (23.4, 5)
  point P1 (27.8054, 5)
  point P2 (17.9849, 5)
  point P3 (-2, 0)
  point P4 (48, 5)
  dimension "d359" = 0.075
extrude "Extrusion17" add sketch "Skizze32" along normal blind 2.5 contours L0 L36 L37 A39 | A39 L37 L36 L0 L55 L54 A54 L29 L1 L28 | L36 A38 A57 L57 A56 L56 A55 L55 L0 | L0 A54 L54 L55
sketch "Skizze33" plane through (-23.4, -25.2, 0) normal (0, -1, 0) x (1, 0, 0)
  arc A0 (28.4, 1.5404) -> (28, 5.5) centre (28, 3.5) ccw projected
  line L0 (-2, 0) -> (48, 0) projected
  line L1 (-2, 5) -> (48, 5) projected
  line L2 (17.9849, 0) -> (27.8054, 0) projected
  line L3 (46, 0) -> (48, 0) projected
  line L4 (48, 0) -> (48, 5) projected
  line L5 (48, 5) -> (46, 5) projected
  line L6 (46, 0) -> (46, 5) projected
  line L7 (0, 0) -> (-2, 0) projected
  line L8 (0, 0) -> (0, 5) projected
  line L9 (-2, 5) -> (0, 5) projected
  line L10 (-2, 0) -> (-2, 5) projected
  circle A1 centre (2.2, -32.9227) radius 1.5 projected
  line L11 (38, -42) -> (8, -42) projected
  arc A2 (38, -42) -> (40, -40) centre (38, -40) ccw projected
  line L12 (40, -40) -> (40, -10) projected
  arc A3 (40, -10) -> (38, -8) centre (38, -10) ccw projected
  line L13 (23.4, -8) -> (38, -8) projected
  circle A4 centre (23.4, -4) radius 4 projected
  line L14 (8, -8) -> (23.4, -8) projected
  arc A5 (8, -8) -> (6, -10) centre (8, -10) ccw projected
  line L15 (6, -10) -> (6, -25.2) projected
  circle A6 centre (2, -25.2) radius 4 projected
  line L16 (6, -25.2) -> (6, -40) projected
  arc A7 (6, -40) -> (8, -42) centre (8, -40) ccw projected
  circle A8 centre (3, -5) radius 2.425 projected
  circle A9 centre (8.5, -4.2) radius 2.65 projected
  circle A10 centre (2.2, -10.5) radius 2.65 projected
  circle A11 centre (2.2, -39.5) radius 2.65 projected
  circle A12 centre (8.5, -45.8) radius 2.65 projected
  circle A13 centre (3, -45) radius 2.425 projected
  circle A14 centre (43.8, -10.5) radius 2.65 projected
  circle A15 centre (37.5, -4.2) radius 2.65 projected
  circle A16 centre (43, -5) radius 2.425 projected
  circle A17 centre (43.8, -39.5) radius 2.65 projected
  circle A18 centre (37.5, -45.8) radius 2.65 projected
  circle A19 centre (43, -45) radius 2.425 projected
  line L17 (27.8804, -50) -> (27.8804, -48.8709) projected
  arc A20 (28.2203, -48.4722) -> (27.8804, -48.8709) centre (28.2921, -48.8777) ccw projected
  line L18 (28.2203, -48.4722) -> (28.341, -48.4417) projected
  arc A21 (28.341, -48.4417) -> (27.7986, -44.3339) centre (28, -46.397) ccw projected
  line L19 (27.7986, -44.3339) -> (18, -44.3339) projected
  arc A22 (18, -44.3339) -> (17.5821, -48.4716) centre (18, -46.4238) ccw projected
  arc A23 (17.9099, -48.8731) -> (17.5821, -48.4716) centre (17.5002, -48.8731) ccw projected
  line L20 (17.9099, -48.8731) -> (17.9099, -50) projected
  line L21 (17.9099, -50) -> (0, -50) projected
  arc A24 (-2, -48) -> (0, -50) centre (0, -48) ccw projected
  line L22 (-2, -30) -> (-2, -48) projected
  line L23 (-3.0505, -30) -> (-2, -30) projected
  arc A25 (-3.0505, -30) -> (-3.5404, -30.4) centre (-3.0505, -30.5) ccw projected
  arc A26 (-7.5, -30) -> (-3.5404, -30.4) centre (-5.5, -30) ccw projected
  line L24 (-7.5, -20) -> (-7.5, -30) projected
  arc A27 (-3.5404, -19.6) -> (-7.5, -20) centre (-5.5, -20) ccw projected
  arc A28 (-3.5404, -19.6) -> (-3.0505, -20) centre (-3.0505, -19.5) ccw projected
  line L25 (-2, -20) -> (-3.0505, -20) projected
  line L26 (-2, -2) -> (-2, -20) projected
  arc A29 (0, 0) -> (-2, -2) centre (0, -2) ccw projected
  line L27 (0, 0) -> (18, 0) projected
  line L28 (18, 1.0505) -> (18, 0) projected
  arc A30 (18, 1.0505) -> (17.6, 1.5404) centre (17.5, 1.0505) ccw projected
  arc A31 (18, 5.5) -> (17.6, 1.5404) centre (18, 3.5) ccw projected
  line L29 (28, 5.5) -> (18, 5.5) projected
  arc A32 (28.4, 1.5404) -> (28, 5.5) centre (28, 3.5) ccw projected
  arc A33 (28.4, 1.5404) -> (28, 1.0505) centre (28.5, 1.0505) ccw projected
  line L30 (28, 0) -> (28, 1.0505) projected
  line L31 (28, 0) -> (46, 0) projected
  arc A34 (48, -2) -> (46, 0) centre (46, -2) ccw projected
  line L32 (48, -20.1196) -> (48, -2) projected
  line L33 (48, -20.1196) -> (46.8709, -20.1196) projected
  arc A35 (46.4722, -19.7797) -> (46.8709, -20.1196) centre (46.8777, -19.7079) ccw projected
  line L34 (46.4722, -19.7797) -> (46.4417, -19.659) projected
  arc A36 (46.4417, -19.659) -> (42.3339, -20.2014) centre (44.397, -20) ccw projected
  line L35 (42.3339, -20.2014) -> (42.3339, -30) projected
  arc A37 (42.3339, -30) -> (46.4716, -30.4179) centre (44.4238, -30) ccw projected
  arc A38 (46.8731, -30.0901) -> (46.4716, -30.4179) centre (46.8731, -30.4998) ccw projected
  line L36 (46.8731, -30.0901) -> (48, -30.0901) projected
  line L37 (48, -48) -> (48, -30.0901) projected
  arc A39 (46, -50) -> (48, -48) centre (46, -48) ccw projected
  line L38 (46, -50) -> (27.8804, -50) projected
  line L39 (48, 0) -> (48, 5) projected
  line L40 (-2, 0) -> (-2, 5) projected
  line L41 (17.9849, -1.1269) -> (17.9849, 0) projected
  arc A40 (17.5971, -1.6019) -> (17.9849, -1.1269) centre (17.5002, -1.1269) ccw projected
  arc A41 (17.5971, -1.6019) -> (18, -5.5911) centre (18, -3.5762) ccw projected
  line L42 (27.8023, -5.5911) -> (18, -5.5911) projected
  arc A42 (27.8023, -5.5911) -> (28.3256, -1.6317) centre (28, -3.603) ccw projected
  line L43 (28.2045, -1.6011) -> (28.3256, -1.6317) projected
  arc A43 (27.8054, -1.1297) -> (28.2045, -1.6011) centre (28.2921, -1.1223) ccw projected
  line L44 (27.8054, 0) -> (27.8054, -1.1297) projected
  point P0 (23.4, 0)
  point P1 (17.9099, 0)
  point P2 (29.3229, 5)
  point P3 (23.4, 0)
  point P4 (16.6771, 5)
extrude "Extrusion18" add sketch "Skizze33" along normal blind 2.5 contours A0 L1 L6 L0 L30 A33 | A31 A30 L28 L0 L8 L1 | L1 L4 L0 L6 | L8 L0 L10 L1
fillet "Rundung5" radius 2 4 edges at (24.6, -27.7, 2.5) (-25.4, -27.7, 2.5) (-25.4, 27.3, 2.5) (24.6, 27.3, 2.5)
equation "\"d_i\" = 40"
equation "\"d_o\" = 40"
equation "\"d_part\" = 50"
equation "\"d6\" = 0"
equation "\"d7\" = 0"
equation "\"d8\" = 0"
equation "\"d9\" = 0"
equation "\"d13\" = 0"
equation "\"d14\" = 0"
equation "\"d20\" = 0"
equation "\"d21\" = 0"
equation "\"d22\" = 0"
equation "\"d23\" = 0"
equation "\"d24\" = 0"
equation "\"d25\" = 3"
equation "\"d26\" = 0"
equation "\"d27\" = 0"
equation "\"d28\" = 0"
equation "\"d29\" = 0"
equation "\"d30\" = 0"
equation "\"d31\" = 0"
equation "\"d32\" = 0"
equation "\"d33\" = 0"
equation "\"d34\" = 0"
equation "\"d46\" = 0"
equation "\"d47\" = 0"
equation "\"d48\" = 0"
equation "\"d50\" = 0"
equation "\"d51\" = 0"
equation "\"d52\" = 0"
equation "\"d53\" = 0"
equation "\"d54\" = 0"
equation "\"d55\" = 0"
equation "\"d56\" = 0"
equation "\"d57\" = 0"
equation "\"d58\" = 0"
equation "\"d59\" = 0"
equation "\"magnet_offset\" = 0"
equation "\"screw_offset\" = 0"
equation "\"mal_puzzle_offset\" = 0"
equation "\"fem_puzzle_offset\" = 0"
properties part number "10_Base_puzzle_sideplate_v3"
